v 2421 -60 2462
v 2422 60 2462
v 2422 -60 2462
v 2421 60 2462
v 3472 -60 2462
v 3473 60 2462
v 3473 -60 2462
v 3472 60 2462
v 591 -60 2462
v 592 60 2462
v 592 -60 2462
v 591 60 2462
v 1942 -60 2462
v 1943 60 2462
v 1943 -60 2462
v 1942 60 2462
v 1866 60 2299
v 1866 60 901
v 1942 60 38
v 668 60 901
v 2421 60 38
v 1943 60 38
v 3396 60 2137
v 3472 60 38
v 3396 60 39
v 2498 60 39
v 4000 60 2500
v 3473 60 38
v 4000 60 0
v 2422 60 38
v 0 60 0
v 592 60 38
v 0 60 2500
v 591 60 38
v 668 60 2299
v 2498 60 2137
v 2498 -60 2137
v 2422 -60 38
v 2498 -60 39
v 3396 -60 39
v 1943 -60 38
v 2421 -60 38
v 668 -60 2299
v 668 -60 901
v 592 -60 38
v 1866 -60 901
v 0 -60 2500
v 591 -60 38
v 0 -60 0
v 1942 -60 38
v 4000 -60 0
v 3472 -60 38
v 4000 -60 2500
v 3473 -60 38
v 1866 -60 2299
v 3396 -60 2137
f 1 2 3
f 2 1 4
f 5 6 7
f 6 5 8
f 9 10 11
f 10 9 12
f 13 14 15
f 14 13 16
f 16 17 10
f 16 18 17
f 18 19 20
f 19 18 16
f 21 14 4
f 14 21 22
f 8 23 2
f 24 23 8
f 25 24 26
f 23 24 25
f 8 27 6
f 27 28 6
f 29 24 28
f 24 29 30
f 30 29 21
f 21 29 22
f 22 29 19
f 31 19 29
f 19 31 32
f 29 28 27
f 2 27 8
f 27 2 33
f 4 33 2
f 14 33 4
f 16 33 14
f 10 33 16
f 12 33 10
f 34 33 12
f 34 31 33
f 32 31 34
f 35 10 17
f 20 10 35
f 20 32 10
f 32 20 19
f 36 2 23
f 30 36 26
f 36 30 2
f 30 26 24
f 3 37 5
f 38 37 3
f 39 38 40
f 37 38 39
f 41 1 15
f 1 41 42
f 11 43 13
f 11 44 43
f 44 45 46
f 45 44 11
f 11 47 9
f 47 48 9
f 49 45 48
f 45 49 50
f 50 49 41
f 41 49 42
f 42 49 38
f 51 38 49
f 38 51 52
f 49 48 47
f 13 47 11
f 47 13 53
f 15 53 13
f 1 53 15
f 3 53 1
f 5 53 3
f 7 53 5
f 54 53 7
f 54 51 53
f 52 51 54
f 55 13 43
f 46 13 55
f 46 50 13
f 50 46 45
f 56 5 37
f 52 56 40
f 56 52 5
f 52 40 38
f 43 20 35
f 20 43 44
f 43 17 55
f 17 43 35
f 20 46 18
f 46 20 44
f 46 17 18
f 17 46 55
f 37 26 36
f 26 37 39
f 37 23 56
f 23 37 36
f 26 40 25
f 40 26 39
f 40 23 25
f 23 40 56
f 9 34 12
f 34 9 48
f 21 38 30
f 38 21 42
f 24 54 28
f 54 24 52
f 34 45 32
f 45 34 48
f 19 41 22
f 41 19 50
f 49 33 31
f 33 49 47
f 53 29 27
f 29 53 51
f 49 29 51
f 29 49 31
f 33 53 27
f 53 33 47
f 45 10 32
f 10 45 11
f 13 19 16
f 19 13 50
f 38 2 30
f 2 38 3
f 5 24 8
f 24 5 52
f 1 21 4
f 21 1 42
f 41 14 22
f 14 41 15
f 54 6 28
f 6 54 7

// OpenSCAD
// Archiyou -> OpenSCAD  |  script: timberwallopenings  |  units: mm
// OpenSCAD has no units: coordinates are in mm.
// Parts: 27 CSG, 13 baked, 2 2D
//   baked: crippleTop (made by split())
//   baked: crippleTop_2 (made by split())
//   baked: crippleBottom (made by split())
//   baked: crippleBottom_2 (made by split())
//   baked: insulation1 (made by _separateSolids())
//   baked: insulation1_2 (made by _separateSolids())
//   baked: insulation2 (made by _separateSolids())
//   baked: insulation2_2 (made by _separateSolids())
//   baked: insulation3 (made by _separateSolids())
//   baked: insulation3_2 (made by _separateSolids())
//   baked: insulation3_3 (made by _separateSolids())
//   baked: insulation5 (made by _separateSolids())
//   baked: insulation5_2 (made by _separateSolids())
// Parameters at export, for reference only (nothing in this file is linked to them):
//   WIDTH = 4000
//   HEIGHT = 2500
//   DEPTH = "120"
//   OPENINGS = [{"name":"kitchen window","left":600,"sill":900,"width":1200,"height":1400},{"name":"door","left":2400,"sill":0,"width":900,"height":2100}]

$fn = 32;
PART = "";

// stud0  (layer wall/studs)
module stud0() {
    color([0, 0.502, 0]) translate([19, 0, 1250]) cube([38, 120, 2424], center = true);
}

// stud6  (layer wall/studs)
module stud6() {
    color([0, 0.502, 0]) translate([3660, 0, 1250]) cube([38, 120, 2424], center = true);
}

// endstud  (layer wall/studs)
module endstud() {
    color([0, 0.502, 0]) translate([3981, 0, 1250]) cube([38, 120, 2424], center = true);
}

// bottomplate  (layer wall/plates)
module bottomplate() {
    color([0, 0.502, 0]) translate([2000, 0, 19]) cube([4000, 120, 38], center = true);
}

// topplate  (layer wall/plates)
module topplate() {
    color([0, 0.502, 0]) translate([2000, 0, 2481]) cube([4000, 120, 38], center = true);
}

// crippleTop  (layer wall/cripplesTop): baked, made by split()
module crippleTop() {
    color([0, 0.502, 0]) polyhedron(
        points = [[1239, -60, 2337], [1201, -60, 2337], [1201, 60, 2337], [1239, 60, 2337], [1201, -60, 2462], [1239, -60, 2462], [1201, 60, 2462], [1239, 60, 2462]],
        faces = [[3, 2, 1, 0], [5, 0, 1, 4], [7, 5, 4, 6], [7, 6, 2, 3], [0, 5, 7, 3], [2, 6, 4, 1]]
    );
}

// crippleTop  (layer wall/cripplesTop): baked, made by split()
module crippleTop_2() {
    color([0, 0.502, 0]) polyhedron(
        points = [[1849, 60, 2337], [1811, 60, 2337], [1811, 60, 2462], [1849, 60, 2462], [1811, -60, 2462], [1811, -60, 2337], [1849, -60, 2337], [1849, -60, 2462]],
        faces = [[3, 2, 1, 0], [5, 1, 2, 4], [0, 1, 5, 6], [0, 6, 7, 3], [2, 3, 7, 4], [4, 7, 6, 5]]
    );
}

// crippleTop  (layer wall/cripplesTop)
module crippleTop_3() {
    color([0, 0.502, 0]) difference() {
        translate([3050, 0, 1250]) cube([38, 120, 2424], center = true);
        multmatrix([[1, 0, 0, 2460], [0, 0, -1, 120], [0, 1, 0, 1], [0, 0, 0, 1]]) linear_extrude(height = 240) polygon([[0, 0], [974, 0], [974, 2174], [0, 2174]]);
    }
}

// crippleBottom  (layer wall/cripplesBottom): baked, made by split()
module crippleBottom() {
    color([0, 0.502, 0]) polyhedron(
        points = [[1201, -60, 38], [1239, -60, 38], [1239, -60, 863], [1201, -60, 863], [1239, 60, 863], [1201, 60, 863], [1201, 60, 38], [1239, 60, 38]],
        faces = [[3, 2, 1, 0], [5, 4, 2, 3], [3, 0, 6, 5], [1, 2, 4, 7], [6, 0, 1, 7], [7, 4, 5, 6]]
    );
}

// crippleBottom  (layer wall/cripplesBottom): baked, made by split()
module crippleBottom_2() {
    color([0, 0.502, 0]) polyhedron(
        points = [[1811, 60, 38], [1811, -60, 38], [1811, -60, 863], [1811, 60, 863], [1849, 60, 863], [1849, 60, 38], [1849, -60, 38], [1849, -60, 863]],
        faces = [[3, 2, 1, 0], [5, 4, 3, 0], [6, 5, 0, 1], [5, 6, 7, 4], [4, 7, 2, 3], [1, 2, 7, 6]]
    );
}

// openingHorizontal  (layer wall/openingFramesHorizontals)
module openingHorizontal() {
    color([1, 0, 0]) translate([1267, 0, 882]) cube([1274, 120, 38], center = true);
}

// openingHorizontal  (layer wall/openingFramesHorizontals)
module openingHorizontal_2() {
    color([1, 0, 0]) translate([1267, 0, 2318]) cube([1274, 120, 38], center = true);
}

// openingHorizontal  (layer wall/openingFramesHorizontals)
module openingHorizontal_3() {
    color([1, 0, 0]) translate([2947, 0, 2156]) cube([974, 120, 38], center = true);
}

// openingVertical  (layer wall/openingFramesVerticals)
module openingVertical() {
    color([1, 0, 0]) difference() {
        translate([649, 0, 1600]) cube([38, 120, 1398], center = true);
        translate([2000, 0, 19]) cube([4000, 120, 38], center = true);
        translate([2000, 0, 2481]) cube([4000, 120, 38], center = true);
    }
}

// openingVertical  (layer wall/openingFramesVerticals)
module openingVertical_2() {
    color([1, 0, 0]) difference() {
        translate([1885, 0, 1600]) cube([38, 120, 1398], center = true);
        translate([2000, 0, 19]) cube([4000, 120, 38], center = true);
        translate([2000, 0, 2481]) cube([4000, 120, 38], center = true);
    }
}

// openingVertical  (layer wall/openingFramesVerticals)
module openingVertical_3() {
    color([1, 0, 0]) difference() {
        translate([2479, 0, 1088]) cube([38, 120, 2098], center = true);
        translate([2000, 0, 19]) cube([4000, 120, 38], center = true);
        translate([2000, 0, 2481]) cube([4000, 120, 38], center = true);
    }
}

// openingVertical  (layer wall/openingFramesVerticals)
module openingVertical_4() {
    color([1, 0, 0]) difference() {
        translate([3415, 0, 1088]) cube([38, 120, 2098], center = true);
        translate([2000, 0, 19]) cube([4000, 120, 38], center = true);
        translate([2000, 0, 2481]) cube([4000, 120, 38], center = true);
    }
}

// openingKingStudLeft  (layer wall/openingKingStuds)
module openingKingStudLeft() {
    color([0.647, 0.165, 0.165]) translate([611, 0, 1250]) cube([38, 120, 2424], center = true);
}

// openingKingStudRight  (layer wall/openingKingStuds)
module openingKingStudRight() {
    color([0.647, 0.165, 0.165]) translate([1923, 0, 1250]) cube([38, 120, 2424], center = true);
}

// openingKingStudLeft  (layer wall/openingKingStuds)
module openingKingStudLeft_2() {
    color([0.647, 0.165, 0.165]) translate([2441, 0, 1250]) cube([38, 120, 2424], center = true);
}

// openingKingStudRight  (layer wall/openingKingStuds)
module openingKingStudRight_2() {
    color([0.647, 0.165, 0.165]) translate([3453, 0, 1250]) cube([38, 120, 2424], center = true);
}

// openingJackLeftBottom  (layer wall/openingJackStuds)
module openingJackLeftBottom() {
    color([0.647, 0.165, 0.165]) translate([649, 0, 450.5]) cube([38, 120, 825], center = true);
}

// openingJackRightBottom  (layer wall/openingJackStuds)
module openingJackRightBottom() {
    color([0.647, 0.165, 0.165]) translate([1885, 0, 450.5]) cube([38, 120, 825], center = true);
}

// openingJackLeftTop  (layer wall/openingJackStuds)
module openingJackLeftTop() {
    color([0.647, 0.165, 0.165]) translate([649, 0, 2399.5]) cube([38, 120, 125], center = true);
}

// openingJackRightTop  (layer wall/openingJackStuds)
module openingJackRightTop() {
    color([0.647, 0.165, 0.165]) translate([1885, 0, 2399.5]) cube([38, 120, 125], center = true);
}

// openingJackLeftTop  (layer wall/openingJackStuds)
module openingJackLeftTop_2() {
    color([0.647, 0.165, 0.165]) translate([2479, 0, 2318.5]) cube([38, 120, 287], center = true);
}

// openingJackRightTop  (layer wall/openingJackStuds)
module openingJackRightTop_2() {
    color([0.647, 0.165, 0.165]) translate([3415, 0, 2318.5]) cube([38, 120, 287], center = true);
}

// insulation0  (layer wall/insulation)
module insulation0() {
    color([0.133, 0.133, 0.133]) difference() {
        translate([314.5, 0, 1250]) cube([553, 120, 2424], center = true);
        multmatrix([[1, 0, 0, 630], [0, 0, -1, 120], [0, 1, 0, 863], [0, 0, 0, 1]]) linear_extrude(height = 240) polygon([[0, 0], [1274, 0], [1274, 1474], [0, 1474]]);
        translate([629, 0, 1250]) cube([76, 132, 2500], center = true);
        translate([1905, 0, 1250]) cube([76, 132, 2500], center = true);
        multmatrix([[1, 0, 0, 2460], [0, 0, -1, 120], [0, 1, 0, 1], [0, 0, 0, 1]]) linear_extrude(height = 240) polygon([[0, 0], [974, 0], [974, 2174], [0, 2174]]);
        translate([2459, 0, 1250]) cube([76, 132, 2500], center = true);
        translate([3435, 0, 1250]) cube([76, 132, 2500], center = true);
    }
}

// insulation1  (layer wall/insulation): baked, made by _separateSolids()
module insulation1() {
    color([0.133, 0.133, 0.133]) polyhedron(
        points = [[1201, 60, 863], [667, 60, 863], [667, -60, 863], [1201, -60, 863], [1201, 60, 38], [1201, -60, 38], [667, -60, 38], [667, 60, 38]],
        faces = [[3, 2, 1, 0], [5, 3, 0, 4], [5, 4, 7, 6], [2, 6, 7, 1], [2, 3, 5, 6], [0, 1, 7, 4]]
    );
}

// insulation1  (layer wall/insulation): baked, made by _separateSolids()
module insulation1_2() {
    color([0.133, 0.133, 0.133]) polyhedron(
        points = [[667, -60, 2462], [1201, -60, 2462], [1201, 60, 2462], [667, 60, 2462], [1201, 60, 2337], [1201, -60, 2337], [667, -60, 2337], [667, 60, 2337]],
        faces = [[3, 2, 1, 0], [5, 1, 2, 4], [5, 6, 0, 1], [0, 6, 7, 3], [7, 6, 5, 4], [3, 7, 4, 2]]
    );
}

// insulation2  (layer wall/insulation): baked, made by _separateSolids()
module insulation2() {
    color([0.133, 0.133, 0.133]) polyhedron(
        points = [[1239, -60, 863], [1239, 60, 863], [1239, 60, 38], [1239, -60, 38], [1811, 60, 863], [1811, -60, 863], [1811, -60, 38], [1811, 60, 38]],
        faces = [[3, 2, 1, 0], [7, 6, 5, 4], [4, 1, 2, 7], [2, 3, 6, 7], [6, 3, 0, 5], [5, 0, 1, 4]]
    );
}

// insulation2  (layer wall/insulation): baked, made by _separateSolids()
module insulation2_2() {
    color([0.133, 0.133, 0.133]) polyhedron(
        points = [[1239, 60, 2337], [1239, 60, 2462], [1811, 60, 2462], [1811, 60, 2337], [1239, -60, 2337], [1239, -60, 2462], [1811, -60, 2462], [1811, -60, 2337]],
        faces = [[3, 2, 1, 0], [1, 5, 4, 0], [6, 5, 1, 2], [7, 6, 2, 3], [5, 6, 7, 4], [3, 0, 4, 7]]
    );
}

// insulation3  (layer wall/insulation): baked, made by _separateSolids()
module insulation3() {
    color([0.133, 0.133, 0.133]) polyhedron(
        points = [[1849, 60, 38], [1849, -60, 38], [1849, -60, 863], [1849, 60, 863], [1867, -60, 38], [1867, -60, 863], [1867, 60, 863], [1867, 60, 38]],
        faces = [[3, 2, 1, 0], [5, 4, 1, 2], [7, 6, 3, 0], [5, 2, 3, 6], [7, 0, 1, 4], [5, 6, 7, 4]]
    );
}

// insulation3  (layer wall/insulation): baked, made by _separateSolids()
module insulation3_2() {
    color([0.133, 0.133, 0.133]) polyhedron(
        points = [[2421, 60, 2462], [2421, -60, 2462], [2421, -60, 38], [2421, 60, 38], [1943, -60, 2462], [1943, -60, 38], [1943, 60, 2462], [1943, 60, 38]],
        faces = [[3, 2, 1, 0], [2, 5, 4, 1], [4, 6, 0, 1], [2, 3, 7, 5], [5, 7, 6, 4], [3, 0, 6, 7]]
    );
}

// insulation3  (layer wall/insulation): baked, made by _separateSolids()
module insulation3_3() {
    color([0.133, 0.133, 0.133]) polyhedron(
        points = [[1849, 60, 2462], [1849, 60, 2337], [1849, -60, 2337], [1849, -60, 2462], [1867, -60, 2462], [1867, 60, 2462], [1867, 60, 2337], [1867, -60, 2337]],
        faces = [[3, 2, 1, 0], [5, 4, 3, 0], [0, 1, 6, 5], [6, 1, 2, 7], [2, 3, 4, 7], [4, 5, 6, 7]]
    );
}

// insulation4  (layer wall/insulation)
module insulation4() {
    color([0.133, 0.133, 0.133]) difference() {
        translate([2745, 0, 1250]) cube([572, 120, 2424], center = true);
        multmatrix([[1, 0, 0, 630], [0, 0, -1, 120], [0, 1, 0, 863], [0, 0, 0, 1]]) linear_extrude(height = 240) polygon([[0, 0], [1274, 0], [1274, 1474], [0, 1474]]);
        translate([629, 0, 1250]) cube([76, 132, 2500], center = true);
        translate([1905, 0, 1250]) cube([76, 132, 2500], center = true);
        multmatrix([[1, 0, 0, 2460], [0, 0, -1, 120], [0, 1, 0, 1], [0, 0, 0, 1]]) linear_extrude(height = 240) polygon([[0, 0], [974, 0], [974, 2174], [0, 2174]]);
        translate([2459, 0, 1250]) cube([76, 132, 2500], center = true);
        translate([3435, 0, 1250]) cube([76, 132, 2500], center = true);
    }
}

// insulation5  (layer wall/insulation): baked, made by _separateSolids()
module insulation5() {
    color([0.133, 0.133, 0.133]) polyhedron(
        points = [[3069, 60, 2175], [3397, 60, 2175], [3397, -60, 2175], [3069, -60, 2175], [3397, -60, 2462], [3069, -60, 2462], [3069, 60, 2462], [3397, 60, 2462]],
        faces = [[3, 2, 1, 0], [5, 4, 2, 3], [7, 4, 5, 6], [1, 7, 6, 0], [5, 3, 0, 6], [1, 2, 4, 7]]
    );
}

// insulation5  (layer wall/insulation): baked, made by _separateSolids()
module insulation5_2() {
    color([0.133, 0.133, 0.133]) polyhedron(
        points = [[3641, 60, 2462], [3473, 60, 2462], [3473, -60, 2462], [3641, -60, 2462], [3641, -60, 38], [3641, 60, 38], [3473, 60, 38], [3473, -60, 38]],
        faces = [[3, 2, 1, 0], [0, 5, 4, 3], [5, 0, 1, 6], [2, 3, 4, 7], [4, 5, 6, 7], [1, 2, 7, 6]]
    );
}

// insulation6  (layer wall/insulation)
module insulation6() {
    color([0.133, 0.133, 0.133]) difference() {
        translate([3820.5, 0, 1250]) cube([283, 120, 2424], center = true);
        multmatrix([[1, 0, 0, 630], [0, 0, -1, 120], [0, 1, 0, 863], [0, 0, 0, 1]]) linear_extrude(height = 240) polygon([[0, 0], [1274, 0], [1274, 1474], [0, 1474]]);
        translate([629, 0, 1250]) cube([76, 132, 2500], center = true);
        translate([1905, 0, 1250]) cube([76, 132, 2500], center = true);
        multmatrix([[1, 0, 0, 2460], [0, 0, -1, 120], [0, 1, 0, 1], [0, 0, 0, 1]]) linear_extrude(height = 240) polygon([[0, 0], [974, 0], [974, 2174], [0, 2174]]);
        translate([2459, 0, 1250]) cube([76, 132, 2500], center = true);
        translate([3435, 0, 1250]) cube([76, 132, 2500], center = true);
    }
}

// Polygon: 2D, drawn in its own plane: origin [600, 0, 900], x [1, 0, 0], y [0, 0, 1]
module Polygon() {
    polygon([[0, 0], [1200, 0], [1200, 1400], [0, 1400]]);
}

// Polygon: 2D, drawn in its own plane: origin [2400, 0, 38], x [1, 0, 0], y [0, 0, 1]
module Polygon_2() {
    polygon([[0, 0], [900, 0], [900, 2100], [0, 2100]]);
}

// frameBottom  (layer Frame)
module frameBottom() {
    translate([2947, 0, 20]) cube([974, 120, 38], center = true);
}

// 3D parts
if (PART == "" || PART == "stud0") stud0();
if (PART == "" || PART == "stud6") stud6();
if (PART == "" || PART == "endstud") endstud();
if (PART == "" || PART == "bottomplate") bottomplate();
if (PART == "" || PART == "topplate") topplate();
if (PART == "" || PART == "crippleTop") crippleTop();
if (PART == "" || PART == "crippleTop_2") crippleTop_2();
if (PART == "" || PART == "crippleTop_3") crippleTop_3();
if (PART == "" || PART == "crippleBottom") crippleBottom();
if (PART == "" || PART == "crippleBottom_2") crippleBottom_2();
if (PART == "" || PART == "openingHorizontal") openingHorizontal();
if (PART == "" || PART == "openingHorizontal_2") openingHorizontal_2();
if (PART == "" || PART == "openingHorizontal_3") openingHorizontal_3();
if (PART == "" || PART == "openingVertical") openingVertical();
if (PART == "" || PART == "openingVertical_2") openingVertical_2();
if (PART == "" || PART == "openingVertical_3") openingVertical_3();
if (PART == "" || PART == "openingVertical_4") openingVertical_4();
if (PART == "" || PART == "openingKingStudLeft") openingKingStudLeft();
if (PART == "" || PART == "openingKingStudRight") openingKingStudRight();
if (PART == "" || PART == "openingKingStudLeft_2") openingKingStudLeft_2();
if (PART == "" || PART == "openingKingStudRight_2") openingKingStudRight_2();
if (PART == "" || PART == "openingJackLeftBottom") openingJackLeftBottom();
if (PART == "" || PART == "openingJackRightBottom") openingJackRightBottom();
if (PART == "" || PART == "openingJackLeftTop") openingJackLeftTop();
if (PART == "" || PART == "openingJackRightTop") openingJackRightTop();
if (PART == "" || PART == "openingJackLeftTop_2") openingJackLeftTop_2();
if (PART == "" || PART == "openingJackRightTop_2") openingJackRightTop_2();
if (PART == "" || PART == "insulation0") insulation0();
if (PART == "" || PART == "insulation1") insulation1();
if (PART == "" || PART == "insulation1_2") insulation1_2();
if (PART == "" || PART == "insulation2") insulation2();
if (PART == "" || PART == "insulation2_2") insulation2_2();
if (PART == "" || PART == "insulation3") insulation3();
if (PART == "" || PART == "insulation3_2") insulation3_2();
if (PART == "" || PART == "insulation3_3") insulation3_3();
if (PART == "" || PART == "insulation4") insulation4();
if (PART == "" || PART == "insulation5") insulation5();
if (PART == "" || PART == "insulation5_2") insulation5_2();
if (PART == "" || PART == "insulation6") insulation6();
if (PART == "" || PART == "frameBottom") frameBottom();
// 2D parts: select one with PART (OpenSCAD cannot render 2D and 3D together)
if (PART == "Polygon") Polygon();
if (PART == "Polygon_2") Polygon_2();
